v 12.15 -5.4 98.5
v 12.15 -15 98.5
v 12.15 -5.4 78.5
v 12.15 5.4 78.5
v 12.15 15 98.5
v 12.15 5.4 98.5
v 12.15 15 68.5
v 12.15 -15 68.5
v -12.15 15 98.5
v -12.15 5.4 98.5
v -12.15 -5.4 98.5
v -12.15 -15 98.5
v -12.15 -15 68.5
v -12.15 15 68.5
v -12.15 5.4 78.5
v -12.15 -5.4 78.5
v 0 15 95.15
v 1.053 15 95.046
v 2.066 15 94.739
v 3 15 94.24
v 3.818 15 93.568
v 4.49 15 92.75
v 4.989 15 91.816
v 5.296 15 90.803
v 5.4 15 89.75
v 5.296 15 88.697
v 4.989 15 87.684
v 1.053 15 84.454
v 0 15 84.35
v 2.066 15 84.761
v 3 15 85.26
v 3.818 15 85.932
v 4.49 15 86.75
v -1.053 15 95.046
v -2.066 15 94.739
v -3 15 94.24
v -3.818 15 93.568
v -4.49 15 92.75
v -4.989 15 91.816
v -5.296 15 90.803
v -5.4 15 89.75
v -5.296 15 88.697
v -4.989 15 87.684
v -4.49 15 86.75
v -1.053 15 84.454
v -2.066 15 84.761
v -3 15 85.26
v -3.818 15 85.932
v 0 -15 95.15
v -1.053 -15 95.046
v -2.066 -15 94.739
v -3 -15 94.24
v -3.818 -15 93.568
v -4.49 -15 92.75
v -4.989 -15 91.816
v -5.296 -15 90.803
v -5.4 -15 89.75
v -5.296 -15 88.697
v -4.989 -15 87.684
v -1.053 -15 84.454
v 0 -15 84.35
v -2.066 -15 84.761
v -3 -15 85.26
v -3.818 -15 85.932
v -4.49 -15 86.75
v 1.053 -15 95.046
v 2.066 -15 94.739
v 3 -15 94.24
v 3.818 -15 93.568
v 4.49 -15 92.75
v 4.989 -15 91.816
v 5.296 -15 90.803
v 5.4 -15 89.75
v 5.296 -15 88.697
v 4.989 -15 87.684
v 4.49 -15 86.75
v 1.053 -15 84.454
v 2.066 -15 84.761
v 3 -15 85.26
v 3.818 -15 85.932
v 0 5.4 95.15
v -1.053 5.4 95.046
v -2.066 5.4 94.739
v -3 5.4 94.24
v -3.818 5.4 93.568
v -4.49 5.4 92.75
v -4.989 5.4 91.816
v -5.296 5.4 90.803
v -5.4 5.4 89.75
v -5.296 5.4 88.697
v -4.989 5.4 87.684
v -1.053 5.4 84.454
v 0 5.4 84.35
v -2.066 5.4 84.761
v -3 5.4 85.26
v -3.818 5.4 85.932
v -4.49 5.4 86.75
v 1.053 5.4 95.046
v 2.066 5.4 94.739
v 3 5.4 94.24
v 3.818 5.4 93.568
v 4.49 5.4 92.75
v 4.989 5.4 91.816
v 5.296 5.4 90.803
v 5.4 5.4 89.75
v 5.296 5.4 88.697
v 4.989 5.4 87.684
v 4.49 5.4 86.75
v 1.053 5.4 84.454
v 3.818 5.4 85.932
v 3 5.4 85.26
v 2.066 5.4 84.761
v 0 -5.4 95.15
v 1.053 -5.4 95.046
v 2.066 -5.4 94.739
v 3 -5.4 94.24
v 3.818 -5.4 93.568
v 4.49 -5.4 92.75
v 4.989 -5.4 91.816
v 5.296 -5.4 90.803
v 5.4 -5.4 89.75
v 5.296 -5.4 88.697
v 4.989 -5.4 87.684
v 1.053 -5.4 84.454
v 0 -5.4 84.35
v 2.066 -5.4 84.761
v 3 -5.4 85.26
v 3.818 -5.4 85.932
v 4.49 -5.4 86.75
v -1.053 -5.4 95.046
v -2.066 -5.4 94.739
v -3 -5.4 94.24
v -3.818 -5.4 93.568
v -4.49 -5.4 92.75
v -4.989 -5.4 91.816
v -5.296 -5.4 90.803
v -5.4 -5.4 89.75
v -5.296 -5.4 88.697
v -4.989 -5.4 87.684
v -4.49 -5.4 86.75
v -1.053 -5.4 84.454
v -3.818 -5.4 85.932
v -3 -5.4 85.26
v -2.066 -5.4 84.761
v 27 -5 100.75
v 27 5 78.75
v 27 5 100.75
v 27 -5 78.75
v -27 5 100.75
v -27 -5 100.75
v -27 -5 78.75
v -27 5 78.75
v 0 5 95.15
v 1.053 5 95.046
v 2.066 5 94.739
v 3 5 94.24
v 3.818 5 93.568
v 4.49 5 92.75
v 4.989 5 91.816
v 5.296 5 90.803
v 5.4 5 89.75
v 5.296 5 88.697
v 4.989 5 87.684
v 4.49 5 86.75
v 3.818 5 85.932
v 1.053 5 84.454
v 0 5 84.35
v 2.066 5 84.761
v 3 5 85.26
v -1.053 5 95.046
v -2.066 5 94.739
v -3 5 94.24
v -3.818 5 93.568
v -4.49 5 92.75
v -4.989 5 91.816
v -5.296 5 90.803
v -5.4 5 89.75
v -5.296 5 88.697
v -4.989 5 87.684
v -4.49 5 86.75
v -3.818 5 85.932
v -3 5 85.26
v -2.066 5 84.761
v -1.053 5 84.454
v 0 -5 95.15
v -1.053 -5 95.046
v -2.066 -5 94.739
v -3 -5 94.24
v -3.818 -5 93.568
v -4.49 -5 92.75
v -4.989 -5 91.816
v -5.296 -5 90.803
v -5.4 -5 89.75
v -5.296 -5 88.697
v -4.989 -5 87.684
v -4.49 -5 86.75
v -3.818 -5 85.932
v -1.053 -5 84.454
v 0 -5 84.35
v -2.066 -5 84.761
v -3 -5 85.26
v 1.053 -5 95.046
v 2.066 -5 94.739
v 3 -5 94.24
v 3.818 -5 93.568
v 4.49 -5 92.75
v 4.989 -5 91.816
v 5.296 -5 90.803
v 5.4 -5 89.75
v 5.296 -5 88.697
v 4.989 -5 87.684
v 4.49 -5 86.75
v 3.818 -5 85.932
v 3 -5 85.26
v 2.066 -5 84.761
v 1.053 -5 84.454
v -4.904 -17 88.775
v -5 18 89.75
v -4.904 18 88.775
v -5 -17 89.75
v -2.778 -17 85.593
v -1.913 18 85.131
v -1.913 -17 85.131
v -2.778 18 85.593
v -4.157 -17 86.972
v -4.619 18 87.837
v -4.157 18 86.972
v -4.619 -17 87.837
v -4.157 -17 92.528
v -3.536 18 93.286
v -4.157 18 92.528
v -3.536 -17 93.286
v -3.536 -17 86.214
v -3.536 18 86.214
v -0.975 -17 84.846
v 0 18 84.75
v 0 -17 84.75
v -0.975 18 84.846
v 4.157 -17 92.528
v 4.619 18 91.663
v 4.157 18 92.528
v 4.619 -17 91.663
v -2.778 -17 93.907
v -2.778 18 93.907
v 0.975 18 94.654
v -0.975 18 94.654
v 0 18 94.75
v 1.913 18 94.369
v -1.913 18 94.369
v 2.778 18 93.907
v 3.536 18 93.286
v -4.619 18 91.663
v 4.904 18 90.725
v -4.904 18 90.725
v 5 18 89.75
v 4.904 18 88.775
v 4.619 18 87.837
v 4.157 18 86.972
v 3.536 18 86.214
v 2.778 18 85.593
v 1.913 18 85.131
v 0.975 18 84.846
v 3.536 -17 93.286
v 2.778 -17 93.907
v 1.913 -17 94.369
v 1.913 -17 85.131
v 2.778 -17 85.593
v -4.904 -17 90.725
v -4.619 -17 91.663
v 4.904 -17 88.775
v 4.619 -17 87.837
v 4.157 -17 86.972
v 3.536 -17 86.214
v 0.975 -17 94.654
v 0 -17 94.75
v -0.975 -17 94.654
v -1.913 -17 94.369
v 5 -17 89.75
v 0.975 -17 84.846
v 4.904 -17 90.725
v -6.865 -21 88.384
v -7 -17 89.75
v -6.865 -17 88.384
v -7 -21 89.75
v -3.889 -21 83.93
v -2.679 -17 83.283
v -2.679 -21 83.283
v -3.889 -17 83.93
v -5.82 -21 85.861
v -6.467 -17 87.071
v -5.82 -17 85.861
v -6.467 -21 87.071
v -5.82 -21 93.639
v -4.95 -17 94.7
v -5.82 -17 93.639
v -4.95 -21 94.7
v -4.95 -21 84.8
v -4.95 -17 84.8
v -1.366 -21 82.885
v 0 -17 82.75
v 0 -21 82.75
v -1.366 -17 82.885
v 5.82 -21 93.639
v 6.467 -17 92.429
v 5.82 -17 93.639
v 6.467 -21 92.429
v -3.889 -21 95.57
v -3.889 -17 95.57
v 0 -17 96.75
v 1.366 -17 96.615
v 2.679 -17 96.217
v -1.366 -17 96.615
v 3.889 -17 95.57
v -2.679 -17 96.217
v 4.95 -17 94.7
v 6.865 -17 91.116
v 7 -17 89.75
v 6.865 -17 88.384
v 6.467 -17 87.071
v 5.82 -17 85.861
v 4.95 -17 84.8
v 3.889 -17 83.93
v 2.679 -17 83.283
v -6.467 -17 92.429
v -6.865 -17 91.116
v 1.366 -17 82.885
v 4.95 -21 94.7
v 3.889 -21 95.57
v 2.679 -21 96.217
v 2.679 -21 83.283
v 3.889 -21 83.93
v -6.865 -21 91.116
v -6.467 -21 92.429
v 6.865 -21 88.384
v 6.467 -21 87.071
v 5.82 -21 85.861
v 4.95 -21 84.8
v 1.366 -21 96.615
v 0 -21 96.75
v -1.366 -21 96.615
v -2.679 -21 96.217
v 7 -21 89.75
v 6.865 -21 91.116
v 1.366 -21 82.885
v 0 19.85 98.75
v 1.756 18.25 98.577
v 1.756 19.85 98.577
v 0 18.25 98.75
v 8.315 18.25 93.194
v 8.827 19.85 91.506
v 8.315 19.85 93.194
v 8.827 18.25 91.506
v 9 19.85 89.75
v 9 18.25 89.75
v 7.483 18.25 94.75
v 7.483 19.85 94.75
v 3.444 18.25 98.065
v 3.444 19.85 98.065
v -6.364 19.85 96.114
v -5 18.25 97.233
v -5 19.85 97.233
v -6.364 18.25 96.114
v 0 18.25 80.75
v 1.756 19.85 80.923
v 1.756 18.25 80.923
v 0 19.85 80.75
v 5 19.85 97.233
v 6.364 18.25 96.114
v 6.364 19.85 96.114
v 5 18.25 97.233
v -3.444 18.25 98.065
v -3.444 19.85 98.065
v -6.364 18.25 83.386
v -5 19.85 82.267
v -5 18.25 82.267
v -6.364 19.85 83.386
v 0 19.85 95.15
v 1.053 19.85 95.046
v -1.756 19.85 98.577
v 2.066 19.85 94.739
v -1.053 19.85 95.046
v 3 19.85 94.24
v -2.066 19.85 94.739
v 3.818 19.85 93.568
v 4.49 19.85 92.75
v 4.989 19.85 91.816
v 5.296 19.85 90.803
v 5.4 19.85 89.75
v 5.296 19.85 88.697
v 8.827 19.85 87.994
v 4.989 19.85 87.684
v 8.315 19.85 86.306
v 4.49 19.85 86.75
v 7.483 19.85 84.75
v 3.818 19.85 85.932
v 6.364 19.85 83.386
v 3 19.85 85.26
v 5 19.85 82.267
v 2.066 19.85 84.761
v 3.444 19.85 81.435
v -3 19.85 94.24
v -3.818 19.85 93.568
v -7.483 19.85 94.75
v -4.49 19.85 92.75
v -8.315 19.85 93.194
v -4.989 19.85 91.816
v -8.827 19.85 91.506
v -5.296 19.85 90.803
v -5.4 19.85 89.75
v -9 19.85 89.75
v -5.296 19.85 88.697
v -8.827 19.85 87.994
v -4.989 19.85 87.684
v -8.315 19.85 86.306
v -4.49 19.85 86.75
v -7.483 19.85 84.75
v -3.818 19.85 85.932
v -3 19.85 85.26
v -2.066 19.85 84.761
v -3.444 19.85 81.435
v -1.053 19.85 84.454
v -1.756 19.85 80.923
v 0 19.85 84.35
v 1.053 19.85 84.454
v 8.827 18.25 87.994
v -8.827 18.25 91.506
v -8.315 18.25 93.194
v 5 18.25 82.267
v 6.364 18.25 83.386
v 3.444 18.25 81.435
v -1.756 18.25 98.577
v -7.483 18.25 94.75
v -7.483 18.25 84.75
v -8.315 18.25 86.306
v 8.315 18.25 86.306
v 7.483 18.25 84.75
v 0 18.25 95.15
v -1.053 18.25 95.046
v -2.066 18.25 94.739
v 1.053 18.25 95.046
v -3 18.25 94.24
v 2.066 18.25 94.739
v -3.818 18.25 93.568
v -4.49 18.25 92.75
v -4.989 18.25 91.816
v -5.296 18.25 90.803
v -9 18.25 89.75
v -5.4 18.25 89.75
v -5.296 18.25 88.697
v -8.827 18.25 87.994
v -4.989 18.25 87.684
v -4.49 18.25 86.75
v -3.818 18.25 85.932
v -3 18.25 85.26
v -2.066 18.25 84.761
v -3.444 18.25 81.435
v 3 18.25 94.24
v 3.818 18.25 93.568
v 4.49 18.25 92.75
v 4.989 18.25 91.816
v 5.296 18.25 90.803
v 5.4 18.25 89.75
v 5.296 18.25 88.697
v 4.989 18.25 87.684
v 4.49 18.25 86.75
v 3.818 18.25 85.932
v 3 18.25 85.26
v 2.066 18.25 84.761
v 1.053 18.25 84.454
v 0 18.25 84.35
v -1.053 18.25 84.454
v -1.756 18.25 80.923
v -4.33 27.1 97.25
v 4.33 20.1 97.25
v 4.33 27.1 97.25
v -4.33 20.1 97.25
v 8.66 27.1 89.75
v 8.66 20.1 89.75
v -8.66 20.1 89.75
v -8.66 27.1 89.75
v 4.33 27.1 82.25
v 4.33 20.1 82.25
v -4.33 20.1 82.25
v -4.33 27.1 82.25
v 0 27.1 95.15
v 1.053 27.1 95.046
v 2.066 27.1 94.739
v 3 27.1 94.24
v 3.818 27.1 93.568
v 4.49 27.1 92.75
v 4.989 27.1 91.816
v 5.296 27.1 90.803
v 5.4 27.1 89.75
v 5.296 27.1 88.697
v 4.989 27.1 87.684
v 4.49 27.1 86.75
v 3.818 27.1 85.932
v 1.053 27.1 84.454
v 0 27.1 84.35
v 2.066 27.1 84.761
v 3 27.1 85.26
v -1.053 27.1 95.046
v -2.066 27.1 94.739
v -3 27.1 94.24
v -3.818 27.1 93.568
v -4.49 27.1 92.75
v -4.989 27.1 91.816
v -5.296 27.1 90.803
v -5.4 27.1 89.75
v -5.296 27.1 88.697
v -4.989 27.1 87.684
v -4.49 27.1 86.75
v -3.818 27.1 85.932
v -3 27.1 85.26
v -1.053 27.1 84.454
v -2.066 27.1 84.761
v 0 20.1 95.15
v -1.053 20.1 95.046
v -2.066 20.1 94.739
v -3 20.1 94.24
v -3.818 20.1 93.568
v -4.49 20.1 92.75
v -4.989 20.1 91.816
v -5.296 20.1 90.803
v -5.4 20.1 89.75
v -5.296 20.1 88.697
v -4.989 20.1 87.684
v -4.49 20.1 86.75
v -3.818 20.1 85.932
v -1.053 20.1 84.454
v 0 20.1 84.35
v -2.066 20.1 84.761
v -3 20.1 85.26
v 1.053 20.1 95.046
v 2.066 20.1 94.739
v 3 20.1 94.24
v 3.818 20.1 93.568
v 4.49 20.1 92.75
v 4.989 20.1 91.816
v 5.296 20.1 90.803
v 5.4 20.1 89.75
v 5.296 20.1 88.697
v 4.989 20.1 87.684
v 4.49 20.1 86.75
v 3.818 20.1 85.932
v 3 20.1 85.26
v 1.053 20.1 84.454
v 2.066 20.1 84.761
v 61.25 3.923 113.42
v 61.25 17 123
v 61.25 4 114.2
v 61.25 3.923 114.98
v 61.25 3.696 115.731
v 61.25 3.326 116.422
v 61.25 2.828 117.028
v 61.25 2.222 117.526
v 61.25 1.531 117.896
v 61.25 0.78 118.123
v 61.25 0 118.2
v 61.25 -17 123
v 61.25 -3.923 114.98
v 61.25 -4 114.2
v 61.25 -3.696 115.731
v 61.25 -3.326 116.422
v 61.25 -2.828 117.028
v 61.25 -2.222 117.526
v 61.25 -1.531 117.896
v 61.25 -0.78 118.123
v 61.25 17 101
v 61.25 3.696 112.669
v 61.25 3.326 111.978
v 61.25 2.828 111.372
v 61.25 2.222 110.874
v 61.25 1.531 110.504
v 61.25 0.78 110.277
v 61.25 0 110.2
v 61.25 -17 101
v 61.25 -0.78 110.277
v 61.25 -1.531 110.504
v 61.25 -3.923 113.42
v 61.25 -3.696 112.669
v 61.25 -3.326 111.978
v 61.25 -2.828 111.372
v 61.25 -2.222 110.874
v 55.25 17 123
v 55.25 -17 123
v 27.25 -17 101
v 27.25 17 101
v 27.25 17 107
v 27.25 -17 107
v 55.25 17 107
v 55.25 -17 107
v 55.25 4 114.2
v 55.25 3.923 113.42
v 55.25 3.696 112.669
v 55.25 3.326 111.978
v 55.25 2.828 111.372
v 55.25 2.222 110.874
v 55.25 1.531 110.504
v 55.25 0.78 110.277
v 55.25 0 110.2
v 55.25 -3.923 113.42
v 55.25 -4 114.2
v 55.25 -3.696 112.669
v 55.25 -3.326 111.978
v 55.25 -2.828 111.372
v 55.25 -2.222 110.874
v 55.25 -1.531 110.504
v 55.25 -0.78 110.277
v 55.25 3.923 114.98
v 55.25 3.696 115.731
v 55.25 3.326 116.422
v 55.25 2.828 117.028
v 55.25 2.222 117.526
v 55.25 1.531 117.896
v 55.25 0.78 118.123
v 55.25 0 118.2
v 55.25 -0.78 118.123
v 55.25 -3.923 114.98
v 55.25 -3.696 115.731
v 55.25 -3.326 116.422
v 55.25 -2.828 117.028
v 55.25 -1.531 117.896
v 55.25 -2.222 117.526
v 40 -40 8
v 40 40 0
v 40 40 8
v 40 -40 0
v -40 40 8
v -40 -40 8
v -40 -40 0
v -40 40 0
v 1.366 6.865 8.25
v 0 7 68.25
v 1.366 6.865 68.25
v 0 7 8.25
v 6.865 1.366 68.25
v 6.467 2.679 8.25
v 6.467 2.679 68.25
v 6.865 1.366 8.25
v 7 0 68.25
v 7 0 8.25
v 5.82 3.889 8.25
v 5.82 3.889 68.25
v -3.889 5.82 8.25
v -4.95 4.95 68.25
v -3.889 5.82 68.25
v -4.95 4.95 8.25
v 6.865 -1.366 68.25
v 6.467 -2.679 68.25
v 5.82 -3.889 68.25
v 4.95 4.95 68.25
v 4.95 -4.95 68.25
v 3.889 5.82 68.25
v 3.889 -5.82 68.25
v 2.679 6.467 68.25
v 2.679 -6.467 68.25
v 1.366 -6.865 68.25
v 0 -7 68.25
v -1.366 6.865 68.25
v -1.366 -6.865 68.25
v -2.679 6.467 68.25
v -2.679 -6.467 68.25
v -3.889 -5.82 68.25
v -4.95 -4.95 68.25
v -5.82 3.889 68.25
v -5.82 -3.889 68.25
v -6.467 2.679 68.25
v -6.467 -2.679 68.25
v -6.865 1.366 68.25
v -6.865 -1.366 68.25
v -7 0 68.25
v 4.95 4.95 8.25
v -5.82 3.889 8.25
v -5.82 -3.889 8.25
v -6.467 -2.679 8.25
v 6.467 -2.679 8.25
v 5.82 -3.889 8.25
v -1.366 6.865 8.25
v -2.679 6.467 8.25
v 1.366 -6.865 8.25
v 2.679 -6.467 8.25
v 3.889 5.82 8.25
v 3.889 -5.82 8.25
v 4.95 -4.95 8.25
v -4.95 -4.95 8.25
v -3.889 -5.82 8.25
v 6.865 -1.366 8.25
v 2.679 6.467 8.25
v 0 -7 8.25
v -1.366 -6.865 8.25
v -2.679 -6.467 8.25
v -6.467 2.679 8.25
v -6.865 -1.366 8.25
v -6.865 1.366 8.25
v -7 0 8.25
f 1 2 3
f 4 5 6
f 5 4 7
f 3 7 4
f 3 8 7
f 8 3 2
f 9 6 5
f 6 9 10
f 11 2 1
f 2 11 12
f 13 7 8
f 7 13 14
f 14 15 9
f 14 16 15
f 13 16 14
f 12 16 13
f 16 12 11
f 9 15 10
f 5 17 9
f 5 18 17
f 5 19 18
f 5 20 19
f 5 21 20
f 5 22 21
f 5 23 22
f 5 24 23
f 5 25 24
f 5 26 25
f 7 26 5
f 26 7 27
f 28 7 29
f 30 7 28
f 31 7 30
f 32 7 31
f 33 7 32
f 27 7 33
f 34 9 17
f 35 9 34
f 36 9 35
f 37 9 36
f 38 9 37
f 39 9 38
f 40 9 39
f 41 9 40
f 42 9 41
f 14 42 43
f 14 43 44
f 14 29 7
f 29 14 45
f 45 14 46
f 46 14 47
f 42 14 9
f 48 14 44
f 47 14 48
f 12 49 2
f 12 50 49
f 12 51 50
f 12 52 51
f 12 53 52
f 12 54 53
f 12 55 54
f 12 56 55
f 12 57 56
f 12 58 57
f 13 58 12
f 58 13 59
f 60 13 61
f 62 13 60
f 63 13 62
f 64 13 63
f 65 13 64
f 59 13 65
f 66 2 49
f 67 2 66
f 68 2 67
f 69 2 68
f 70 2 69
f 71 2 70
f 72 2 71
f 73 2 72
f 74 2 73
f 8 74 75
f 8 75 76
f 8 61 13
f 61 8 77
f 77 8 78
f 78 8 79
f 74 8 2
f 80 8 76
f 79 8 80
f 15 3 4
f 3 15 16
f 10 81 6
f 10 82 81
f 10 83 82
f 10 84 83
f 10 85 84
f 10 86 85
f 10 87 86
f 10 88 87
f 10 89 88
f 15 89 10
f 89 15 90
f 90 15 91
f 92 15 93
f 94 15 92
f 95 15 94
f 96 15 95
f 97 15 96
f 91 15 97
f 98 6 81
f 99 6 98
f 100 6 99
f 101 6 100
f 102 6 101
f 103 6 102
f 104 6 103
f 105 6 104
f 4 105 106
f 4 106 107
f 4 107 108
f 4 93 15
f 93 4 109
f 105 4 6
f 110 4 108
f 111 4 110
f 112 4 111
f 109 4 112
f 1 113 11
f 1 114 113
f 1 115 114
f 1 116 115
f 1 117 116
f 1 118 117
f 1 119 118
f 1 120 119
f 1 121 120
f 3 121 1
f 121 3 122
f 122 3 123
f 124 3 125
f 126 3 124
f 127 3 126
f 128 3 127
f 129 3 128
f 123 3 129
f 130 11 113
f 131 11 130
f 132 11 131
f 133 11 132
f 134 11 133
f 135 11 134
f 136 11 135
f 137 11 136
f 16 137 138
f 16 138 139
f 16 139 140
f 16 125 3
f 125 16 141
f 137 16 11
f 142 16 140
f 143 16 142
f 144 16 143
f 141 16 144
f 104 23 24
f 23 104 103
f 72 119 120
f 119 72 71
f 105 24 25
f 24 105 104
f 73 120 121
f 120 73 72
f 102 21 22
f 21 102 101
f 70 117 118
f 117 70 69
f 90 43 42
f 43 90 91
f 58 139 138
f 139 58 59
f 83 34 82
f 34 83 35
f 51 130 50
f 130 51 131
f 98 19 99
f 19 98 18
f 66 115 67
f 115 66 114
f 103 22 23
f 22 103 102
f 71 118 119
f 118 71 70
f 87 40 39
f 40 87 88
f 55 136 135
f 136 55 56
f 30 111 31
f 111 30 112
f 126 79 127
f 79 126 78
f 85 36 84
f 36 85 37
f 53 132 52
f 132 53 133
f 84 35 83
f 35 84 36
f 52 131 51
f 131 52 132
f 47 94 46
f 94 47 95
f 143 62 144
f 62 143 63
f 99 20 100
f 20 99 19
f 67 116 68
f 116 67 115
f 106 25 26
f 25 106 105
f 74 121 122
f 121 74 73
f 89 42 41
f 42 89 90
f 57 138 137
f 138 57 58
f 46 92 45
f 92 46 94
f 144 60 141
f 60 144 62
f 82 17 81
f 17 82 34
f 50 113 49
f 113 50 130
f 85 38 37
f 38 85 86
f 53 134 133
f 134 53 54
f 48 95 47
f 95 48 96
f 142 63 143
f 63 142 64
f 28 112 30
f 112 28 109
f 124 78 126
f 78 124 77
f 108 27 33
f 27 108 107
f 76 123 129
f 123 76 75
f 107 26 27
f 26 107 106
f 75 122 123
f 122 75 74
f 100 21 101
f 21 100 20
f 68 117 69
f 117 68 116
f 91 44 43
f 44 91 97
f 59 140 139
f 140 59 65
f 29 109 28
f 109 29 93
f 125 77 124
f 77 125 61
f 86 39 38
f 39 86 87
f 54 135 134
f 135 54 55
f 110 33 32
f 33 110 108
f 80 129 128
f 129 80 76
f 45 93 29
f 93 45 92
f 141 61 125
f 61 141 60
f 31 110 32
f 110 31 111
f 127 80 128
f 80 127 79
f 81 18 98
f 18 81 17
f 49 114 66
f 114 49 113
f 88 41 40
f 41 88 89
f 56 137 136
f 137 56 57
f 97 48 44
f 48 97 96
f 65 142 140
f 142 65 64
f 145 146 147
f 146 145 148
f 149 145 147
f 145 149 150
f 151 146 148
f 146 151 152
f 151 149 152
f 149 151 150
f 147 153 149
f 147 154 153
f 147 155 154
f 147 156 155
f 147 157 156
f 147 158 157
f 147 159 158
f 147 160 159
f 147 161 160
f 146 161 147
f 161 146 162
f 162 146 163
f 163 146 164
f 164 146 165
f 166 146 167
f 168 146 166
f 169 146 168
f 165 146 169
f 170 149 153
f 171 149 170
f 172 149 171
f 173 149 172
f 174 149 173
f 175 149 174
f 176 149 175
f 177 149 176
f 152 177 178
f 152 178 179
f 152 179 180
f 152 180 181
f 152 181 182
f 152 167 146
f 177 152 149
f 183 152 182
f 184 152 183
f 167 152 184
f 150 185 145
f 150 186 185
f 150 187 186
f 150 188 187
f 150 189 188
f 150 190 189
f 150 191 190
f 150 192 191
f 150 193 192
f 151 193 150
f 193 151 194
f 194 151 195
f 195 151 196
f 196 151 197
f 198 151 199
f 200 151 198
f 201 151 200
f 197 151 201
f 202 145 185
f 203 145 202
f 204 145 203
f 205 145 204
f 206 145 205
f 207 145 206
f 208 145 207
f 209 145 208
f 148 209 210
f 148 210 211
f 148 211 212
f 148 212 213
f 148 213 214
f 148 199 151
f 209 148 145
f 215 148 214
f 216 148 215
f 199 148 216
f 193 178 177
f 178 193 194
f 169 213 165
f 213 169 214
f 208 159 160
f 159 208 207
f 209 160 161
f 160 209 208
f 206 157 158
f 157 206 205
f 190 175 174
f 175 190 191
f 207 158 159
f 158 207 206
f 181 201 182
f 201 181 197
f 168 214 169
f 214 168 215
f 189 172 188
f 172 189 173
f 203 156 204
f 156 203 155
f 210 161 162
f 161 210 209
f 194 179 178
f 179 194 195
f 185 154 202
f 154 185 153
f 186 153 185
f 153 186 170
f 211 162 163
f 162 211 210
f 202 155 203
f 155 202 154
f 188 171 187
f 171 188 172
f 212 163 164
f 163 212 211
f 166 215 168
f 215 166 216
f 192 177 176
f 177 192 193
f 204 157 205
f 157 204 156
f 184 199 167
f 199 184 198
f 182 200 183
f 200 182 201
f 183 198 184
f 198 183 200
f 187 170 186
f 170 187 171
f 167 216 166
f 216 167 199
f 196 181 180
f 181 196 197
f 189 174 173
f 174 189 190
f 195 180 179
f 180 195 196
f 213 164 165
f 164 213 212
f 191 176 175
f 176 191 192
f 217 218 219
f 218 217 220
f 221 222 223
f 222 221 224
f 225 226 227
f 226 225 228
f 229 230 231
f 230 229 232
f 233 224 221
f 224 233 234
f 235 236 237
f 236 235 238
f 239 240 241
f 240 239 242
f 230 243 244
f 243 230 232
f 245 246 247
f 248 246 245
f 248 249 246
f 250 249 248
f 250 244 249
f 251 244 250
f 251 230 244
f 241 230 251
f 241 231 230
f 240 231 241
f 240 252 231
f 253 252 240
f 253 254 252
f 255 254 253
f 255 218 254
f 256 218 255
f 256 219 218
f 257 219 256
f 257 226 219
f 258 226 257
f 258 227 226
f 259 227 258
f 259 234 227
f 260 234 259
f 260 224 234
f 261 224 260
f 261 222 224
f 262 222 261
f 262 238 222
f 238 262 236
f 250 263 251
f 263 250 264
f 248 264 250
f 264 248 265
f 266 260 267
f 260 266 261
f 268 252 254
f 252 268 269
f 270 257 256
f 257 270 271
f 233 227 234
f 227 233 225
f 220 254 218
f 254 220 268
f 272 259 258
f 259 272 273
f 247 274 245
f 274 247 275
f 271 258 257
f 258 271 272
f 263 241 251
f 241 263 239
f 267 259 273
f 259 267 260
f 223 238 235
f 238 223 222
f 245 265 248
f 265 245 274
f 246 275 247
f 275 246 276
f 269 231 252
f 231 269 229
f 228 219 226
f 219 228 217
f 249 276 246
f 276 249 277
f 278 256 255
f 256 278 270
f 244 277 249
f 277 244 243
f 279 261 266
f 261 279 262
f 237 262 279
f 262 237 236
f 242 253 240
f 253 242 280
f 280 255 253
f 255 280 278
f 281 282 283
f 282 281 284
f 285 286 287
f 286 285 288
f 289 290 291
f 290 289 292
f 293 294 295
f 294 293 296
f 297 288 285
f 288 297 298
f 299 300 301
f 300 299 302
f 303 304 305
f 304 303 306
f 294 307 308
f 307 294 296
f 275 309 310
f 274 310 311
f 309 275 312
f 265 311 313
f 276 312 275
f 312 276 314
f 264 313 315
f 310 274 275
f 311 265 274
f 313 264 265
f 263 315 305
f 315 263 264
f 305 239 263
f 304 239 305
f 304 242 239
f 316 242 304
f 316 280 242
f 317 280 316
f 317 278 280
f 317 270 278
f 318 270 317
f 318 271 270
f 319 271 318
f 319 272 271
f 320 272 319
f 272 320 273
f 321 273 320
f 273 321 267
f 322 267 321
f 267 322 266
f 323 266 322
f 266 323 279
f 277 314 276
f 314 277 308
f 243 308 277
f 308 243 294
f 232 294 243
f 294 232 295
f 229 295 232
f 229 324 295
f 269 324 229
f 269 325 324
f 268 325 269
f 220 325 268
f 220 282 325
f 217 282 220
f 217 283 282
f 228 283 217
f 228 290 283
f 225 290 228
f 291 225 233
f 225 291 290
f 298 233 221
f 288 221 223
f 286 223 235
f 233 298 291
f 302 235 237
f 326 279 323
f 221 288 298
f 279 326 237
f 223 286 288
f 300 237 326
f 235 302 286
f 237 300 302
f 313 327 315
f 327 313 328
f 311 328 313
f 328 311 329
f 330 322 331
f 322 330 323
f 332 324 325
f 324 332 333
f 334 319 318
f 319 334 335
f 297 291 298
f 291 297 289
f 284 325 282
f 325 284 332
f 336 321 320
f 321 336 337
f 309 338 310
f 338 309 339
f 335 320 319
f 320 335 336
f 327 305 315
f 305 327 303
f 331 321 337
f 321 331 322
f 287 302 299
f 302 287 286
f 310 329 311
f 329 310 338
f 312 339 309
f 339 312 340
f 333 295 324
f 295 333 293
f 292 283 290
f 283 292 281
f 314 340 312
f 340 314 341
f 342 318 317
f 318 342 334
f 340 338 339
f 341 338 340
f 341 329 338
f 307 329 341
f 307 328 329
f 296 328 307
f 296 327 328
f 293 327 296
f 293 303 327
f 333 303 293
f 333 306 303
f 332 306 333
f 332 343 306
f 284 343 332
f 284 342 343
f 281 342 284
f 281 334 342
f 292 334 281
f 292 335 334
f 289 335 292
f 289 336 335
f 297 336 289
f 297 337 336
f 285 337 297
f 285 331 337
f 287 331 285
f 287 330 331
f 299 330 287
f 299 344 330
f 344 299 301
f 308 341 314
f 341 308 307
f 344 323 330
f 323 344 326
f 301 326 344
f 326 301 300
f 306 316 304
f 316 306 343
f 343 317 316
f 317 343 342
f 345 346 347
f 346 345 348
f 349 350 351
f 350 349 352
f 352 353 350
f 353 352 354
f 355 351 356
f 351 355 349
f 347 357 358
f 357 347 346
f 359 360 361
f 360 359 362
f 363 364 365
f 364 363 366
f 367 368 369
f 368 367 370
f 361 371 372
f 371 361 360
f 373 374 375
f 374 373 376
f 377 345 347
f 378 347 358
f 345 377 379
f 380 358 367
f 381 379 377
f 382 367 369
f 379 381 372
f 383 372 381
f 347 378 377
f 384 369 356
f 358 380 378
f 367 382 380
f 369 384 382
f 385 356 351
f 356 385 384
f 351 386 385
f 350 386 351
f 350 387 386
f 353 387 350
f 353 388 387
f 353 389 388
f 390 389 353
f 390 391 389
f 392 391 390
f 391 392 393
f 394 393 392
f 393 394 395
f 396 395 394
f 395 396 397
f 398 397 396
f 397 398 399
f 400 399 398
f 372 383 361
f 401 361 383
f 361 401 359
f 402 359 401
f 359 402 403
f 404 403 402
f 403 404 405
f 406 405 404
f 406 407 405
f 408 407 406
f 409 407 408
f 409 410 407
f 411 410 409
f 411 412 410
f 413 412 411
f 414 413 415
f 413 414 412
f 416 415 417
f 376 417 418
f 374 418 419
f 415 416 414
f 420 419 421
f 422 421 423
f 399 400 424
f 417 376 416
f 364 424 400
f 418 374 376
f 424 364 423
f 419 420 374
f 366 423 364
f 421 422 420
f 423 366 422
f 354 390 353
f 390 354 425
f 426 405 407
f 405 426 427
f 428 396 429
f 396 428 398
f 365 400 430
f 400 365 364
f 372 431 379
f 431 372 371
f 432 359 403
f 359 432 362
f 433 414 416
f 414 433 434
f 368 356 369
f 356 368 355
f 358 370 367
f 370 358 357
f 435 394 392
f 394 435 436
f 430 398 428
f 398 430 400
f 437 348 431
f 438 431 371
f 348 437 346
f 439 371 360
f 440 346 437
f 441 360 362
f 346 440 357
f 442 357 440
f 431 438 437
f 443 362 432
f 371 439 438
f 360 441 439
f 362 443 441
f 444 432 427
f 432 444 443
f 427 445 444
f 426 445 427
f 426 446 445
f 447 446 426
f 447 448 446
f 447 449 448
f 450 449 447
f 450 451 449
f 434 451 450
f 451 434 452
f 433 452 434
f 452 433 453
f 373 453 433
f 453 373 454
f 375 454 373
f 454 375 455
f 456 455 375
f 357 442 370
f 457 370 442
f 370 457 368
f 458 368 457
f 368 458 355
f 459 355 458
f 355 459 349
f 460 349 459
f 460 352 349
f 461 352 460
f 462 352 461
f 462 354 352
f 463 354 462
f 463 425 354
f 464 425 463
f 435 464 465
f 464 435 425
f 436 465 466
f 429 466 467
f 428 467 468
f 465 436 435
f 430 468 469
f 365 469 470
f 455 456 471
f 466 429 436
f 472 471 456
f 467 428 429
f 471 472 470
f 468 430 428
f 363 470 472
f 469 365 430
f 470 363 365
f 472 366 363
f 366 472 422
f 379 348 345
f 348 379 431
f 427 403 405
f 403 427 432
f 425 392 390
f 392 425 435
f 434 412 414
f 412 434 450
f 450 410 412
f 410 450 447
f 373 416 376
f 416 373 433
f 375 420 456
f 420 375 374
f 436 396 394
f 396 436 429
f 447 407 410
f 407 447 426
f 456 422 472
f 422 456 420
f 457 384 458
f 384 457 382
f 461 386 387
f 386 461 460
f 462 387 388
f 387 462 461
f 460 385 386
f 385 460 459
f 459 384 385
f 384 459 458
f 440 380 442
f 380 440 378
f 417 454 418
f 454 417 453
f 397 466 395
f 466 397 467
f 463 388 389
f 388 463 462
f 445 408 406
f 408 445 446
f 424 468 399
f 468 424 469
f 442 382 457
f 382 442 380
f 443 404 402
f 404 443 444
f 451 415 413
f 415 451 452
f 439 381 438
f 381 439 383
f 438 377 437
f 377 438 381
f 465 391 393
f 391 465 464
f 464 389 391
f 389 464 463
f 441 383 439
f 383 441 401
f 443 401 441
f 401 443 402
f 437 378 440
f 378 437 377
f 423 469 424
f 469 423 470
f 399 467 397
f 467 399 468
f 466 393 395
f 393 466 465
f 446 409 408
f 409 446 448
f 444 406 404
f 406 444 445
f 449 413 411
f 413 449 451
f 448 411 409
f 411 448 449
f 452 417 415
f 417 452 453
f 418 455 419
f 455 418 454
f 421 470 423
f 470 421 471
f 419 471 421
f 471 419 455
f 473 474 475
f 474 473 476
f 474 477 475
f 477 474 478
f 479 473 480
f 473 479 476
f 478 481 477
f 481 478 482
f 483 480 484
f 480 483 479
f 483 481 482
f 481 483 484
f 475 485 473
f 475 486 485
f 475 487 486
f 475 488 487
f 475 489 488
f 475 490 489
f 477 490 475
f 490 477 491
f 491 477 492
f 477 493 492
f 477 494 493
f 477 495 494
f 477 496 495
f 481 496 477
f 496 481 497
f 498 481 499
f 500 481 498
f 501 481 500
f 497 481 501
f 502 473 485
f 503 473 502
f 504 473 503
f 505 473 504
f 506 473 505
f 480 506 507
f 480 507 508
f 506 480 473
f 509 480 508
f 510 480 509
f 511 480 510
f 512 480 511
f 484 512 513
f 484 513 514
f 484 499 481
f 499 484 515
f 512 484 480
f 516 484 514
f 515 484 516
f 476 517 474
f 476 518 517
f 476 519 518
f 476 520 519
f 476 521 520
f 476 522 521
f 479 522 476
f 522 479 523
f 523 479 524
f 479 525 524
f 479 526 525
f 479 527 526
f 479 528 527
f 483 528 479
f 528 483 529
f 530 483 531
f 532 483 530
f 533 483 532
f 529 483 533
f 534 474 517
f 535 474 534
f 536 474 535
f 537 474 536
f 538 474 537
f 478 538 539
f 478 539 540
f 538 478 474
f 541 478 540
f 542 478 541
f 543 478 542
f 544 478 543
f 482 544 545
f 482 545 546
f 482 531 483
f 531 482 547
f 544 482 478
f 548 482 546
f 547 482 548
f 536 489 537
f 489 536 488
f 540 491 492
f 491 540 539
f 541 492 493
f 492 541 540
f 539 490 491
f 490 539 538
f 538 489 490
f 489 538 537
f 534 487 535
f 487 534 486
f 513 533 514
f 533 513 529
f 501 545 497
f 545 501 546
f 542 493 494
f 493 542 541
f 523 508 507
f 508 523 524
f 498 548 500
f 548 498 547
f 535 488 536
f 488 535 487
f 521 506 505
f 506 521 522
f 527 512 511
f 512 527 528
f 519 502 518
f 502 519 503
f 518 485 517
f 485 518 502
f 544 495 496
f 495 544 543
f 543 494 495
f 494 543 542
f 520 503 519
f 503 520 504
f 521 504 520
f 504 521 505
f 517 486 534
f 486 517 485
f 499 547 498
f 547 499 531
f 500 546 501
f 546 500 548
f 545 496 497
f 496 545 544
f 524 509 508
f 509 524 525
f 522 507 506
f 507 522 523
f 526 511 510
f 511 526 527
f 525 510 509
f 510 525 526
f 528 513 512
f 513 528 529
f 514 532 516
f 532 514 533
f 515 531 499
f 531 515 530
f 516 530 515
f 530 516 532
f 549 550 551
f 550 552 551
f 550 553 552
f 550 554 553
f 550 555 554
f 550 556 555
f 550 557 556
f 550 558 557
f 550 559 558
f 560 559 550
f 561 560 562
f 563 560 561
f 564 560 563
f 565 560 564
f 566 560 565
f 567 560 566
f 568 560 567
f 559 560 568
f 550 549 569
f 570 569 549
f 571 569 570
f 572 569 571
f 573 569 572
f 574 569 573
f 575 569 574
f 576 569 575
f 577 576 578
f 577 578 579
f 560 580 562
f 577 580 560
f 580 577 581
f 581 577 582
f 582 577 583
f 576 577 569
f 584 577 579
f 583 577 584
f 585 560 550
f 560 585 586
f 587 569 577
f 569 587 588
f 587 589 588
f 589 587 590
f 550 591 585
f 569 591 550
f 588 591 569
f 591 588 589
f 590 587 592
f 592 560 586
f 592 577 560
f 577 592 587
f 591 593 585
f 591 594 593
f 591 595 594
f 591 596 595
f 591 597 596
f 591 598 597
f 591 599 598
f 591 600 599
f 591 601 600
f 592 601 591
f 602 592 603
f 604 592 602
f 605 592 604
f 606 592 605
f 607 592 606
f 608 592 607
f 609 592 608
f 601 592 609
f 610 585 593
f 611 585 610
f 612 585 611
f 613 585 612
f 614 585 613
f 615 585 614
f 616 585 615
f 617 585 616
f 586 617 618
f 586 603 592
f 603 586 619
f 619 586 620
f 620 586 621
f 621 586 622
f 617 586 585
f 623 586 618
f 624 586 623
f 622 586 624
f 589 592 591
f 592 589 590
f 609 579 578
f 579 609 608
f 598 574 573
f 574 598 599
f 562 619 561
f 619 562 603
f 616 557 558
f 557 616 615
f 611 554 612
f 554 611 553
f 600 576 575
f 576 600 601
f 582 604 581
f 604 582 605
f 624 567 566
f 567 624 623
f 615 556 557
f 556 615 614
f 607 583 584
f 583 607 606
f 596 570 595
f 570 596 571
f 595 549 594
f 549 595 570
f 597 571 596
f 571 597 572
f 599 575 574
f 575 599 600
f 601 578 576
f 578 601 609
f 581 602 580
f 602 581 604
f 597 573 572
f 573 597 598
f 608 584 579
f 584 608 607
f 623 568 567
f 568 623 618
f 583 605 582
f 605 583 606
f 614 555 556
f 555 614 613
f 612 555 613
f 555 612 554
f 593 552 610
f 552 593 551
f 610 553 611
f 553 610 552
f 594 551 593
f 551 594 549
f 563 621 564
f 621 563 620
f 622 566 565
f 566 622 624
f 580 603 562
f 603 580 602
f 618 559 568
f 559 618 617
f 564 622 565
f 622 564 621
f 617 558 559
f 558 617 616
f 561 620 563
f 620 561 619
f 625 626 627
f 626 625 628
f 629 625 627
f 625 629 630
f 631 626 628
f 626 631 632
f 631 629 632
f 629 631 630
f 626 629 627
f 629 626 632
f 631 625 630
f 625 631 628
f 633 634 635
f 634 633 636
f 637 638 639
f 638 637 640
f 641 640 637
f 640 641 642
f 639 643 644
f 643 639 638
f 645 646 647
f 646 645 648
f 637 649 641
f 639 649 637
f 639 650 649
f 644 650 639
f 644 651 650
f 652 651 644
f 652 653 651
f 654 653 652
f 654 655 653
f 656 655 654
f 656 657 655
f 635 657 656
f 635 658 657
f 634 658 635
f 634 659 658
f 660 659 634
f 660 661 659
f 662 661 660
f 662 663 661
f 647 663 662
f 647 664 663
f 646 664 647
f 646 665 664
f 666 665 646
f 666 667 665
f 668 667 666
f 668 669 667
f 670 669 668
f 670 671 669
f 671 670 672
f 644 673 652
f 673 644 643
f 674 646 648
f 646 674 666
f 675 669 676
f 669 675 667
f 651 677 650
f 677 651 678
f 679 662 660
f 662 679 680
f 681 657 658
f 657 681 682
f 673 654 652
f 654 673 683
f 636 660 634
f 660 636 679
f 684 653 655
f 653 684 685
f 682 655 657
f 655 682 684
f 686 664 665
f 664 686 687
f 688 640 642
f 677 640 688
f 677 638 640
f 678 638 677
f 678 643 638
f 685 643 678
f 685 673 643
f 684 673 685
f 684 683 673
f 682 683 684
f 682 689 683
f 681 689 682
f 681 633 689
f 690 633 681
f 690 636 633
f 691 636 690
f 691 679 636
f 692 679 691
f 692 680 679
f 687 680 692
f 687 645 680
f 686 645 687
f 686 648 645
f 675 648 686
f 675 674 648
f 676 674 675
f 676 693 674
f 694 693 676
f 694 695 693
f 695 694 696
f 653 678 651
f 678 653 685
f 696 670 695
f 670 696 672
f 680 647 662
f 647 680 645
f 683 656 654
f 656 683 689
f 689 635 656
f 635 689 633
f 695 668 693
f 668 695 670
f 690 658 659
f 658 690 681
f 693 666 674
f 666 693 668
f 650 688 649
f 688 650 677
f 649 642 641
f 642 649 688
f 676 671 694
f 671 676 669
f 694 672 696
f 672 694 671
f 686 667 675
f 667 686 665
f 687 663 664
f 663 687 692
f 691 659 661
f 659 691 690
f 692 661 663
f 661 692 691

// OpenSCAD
$fn = 32;

// ------------------------------------------------------------------------
// Lamp arm: column d14 x 60 mm, arm 54 mm
// Every part is its own module, assembly() places every instance.
// ------------------------------------------------------------------------

// --- part 1 ---
module lamp_base() {
  difference() {
    translate([-40, -40, 0]) cube([80, 80, 8]);
  }
}

// --- part 2 ---
module lamp_column() {
  cylinder(h = 60, d = 14);
}

// --- part 3 ---
module head_fork() {
  difference() {
    translate([-12.15, -15, 0]) cube([24.3, 30, 30]);
    translate([-13.15, -5.4, 10]) cube([26.3, 10.8, 21]);
    translate([0, 0, 21.25]) rotate([90, 0, 0]) cylinder(h = 32, d = 10.8, center = true);
  }
}

// --- part 4 ---
module lamp_arm() {
  difference() {
    translate([-27, -5, 0]) cube([54, 10, 22]);
    translate([0, 0, 11]) rotate([90, 0, 0]) cylinder(h = 12, d = 10.8, center = true);
  }
}

// --- part 5 ---
module arm_pin() {
  rotate([0, 90, 0]) cylinder(h = 36, d = 10, center = true);
  translate([-21, 0, 0]) rotate([0, 90, 0]) cylinder(h = 4, d = 14);
}

// --- part 6 ---
module arm_washer() {
  difference() {
      translate([0, 0, 0]) cylinder(h = 1.6, d = 18);
      translate([0, 0, -1]) cylinder(h = 3.6, d = 10.8);
    }
}

// --- part 7 ---
module arm_nut() {
  difference() {
    linear_extrude(height = 7) polygon(points = [[8.66, 0], [4.33, 7.5], [-4.33, 7.5], [-8.66, 0], [-4.33, -7.5], [4.33, -7.5]]);
    translate([0, 0, -1]) cylinder(h = 9, d = 10.8);
  }
}

// --- part 8 ---
module shade_bracket() {
  difference() {
    translate([-17, -17, 0]) cube([34, 34, 22]);
    translate([-18, -18, 6]) cube([29, 36, 17]);
    translate([14, 0, 13.2]) rotate([0, 90, 0]) cylinder(h = 8, d = 8, center = true);
  }
}

// --- assembly ---
module assembly() {
  color([0.80, 0.24, 0.20]) translate([0, 0, 0]) rotate([0, 0, 0]) lamp_base();
  color([0.20, 0.45, 0.75]) translate([0, 0, 8.25]) rotate([0, 0, 0]) lamp_column();
  color([0.25, 0.62, 0.32]) translate([0, 0, 68.5]) rotate([0, 0, 0]) head_fork();
  color([0.92, 0.70, 0.18]) translate([0, 0, 78.75]) rotate([0, 0, 0]) lamp_arm();
  color([0.58, 0.35, 0.70]) translate([0, 0, 89.75]) rotate([0, 0, 90]) arm_pin();
  color([0.16, 0.66, 0.66]) translate([0, 19.85, 89.75]) rotate([90, 0, 0]) arm_washer();
  color([0.85, 0.48, 0.18]) translate([0, 27.1, 89.75]) rotate([90, 0, 0]) arm_nut();
  color([0.55, 0.60, 0.65]) translate([44.25, 0, 101]) rotate([0, 0, 0]) shade_bracket();
}

assembly();
